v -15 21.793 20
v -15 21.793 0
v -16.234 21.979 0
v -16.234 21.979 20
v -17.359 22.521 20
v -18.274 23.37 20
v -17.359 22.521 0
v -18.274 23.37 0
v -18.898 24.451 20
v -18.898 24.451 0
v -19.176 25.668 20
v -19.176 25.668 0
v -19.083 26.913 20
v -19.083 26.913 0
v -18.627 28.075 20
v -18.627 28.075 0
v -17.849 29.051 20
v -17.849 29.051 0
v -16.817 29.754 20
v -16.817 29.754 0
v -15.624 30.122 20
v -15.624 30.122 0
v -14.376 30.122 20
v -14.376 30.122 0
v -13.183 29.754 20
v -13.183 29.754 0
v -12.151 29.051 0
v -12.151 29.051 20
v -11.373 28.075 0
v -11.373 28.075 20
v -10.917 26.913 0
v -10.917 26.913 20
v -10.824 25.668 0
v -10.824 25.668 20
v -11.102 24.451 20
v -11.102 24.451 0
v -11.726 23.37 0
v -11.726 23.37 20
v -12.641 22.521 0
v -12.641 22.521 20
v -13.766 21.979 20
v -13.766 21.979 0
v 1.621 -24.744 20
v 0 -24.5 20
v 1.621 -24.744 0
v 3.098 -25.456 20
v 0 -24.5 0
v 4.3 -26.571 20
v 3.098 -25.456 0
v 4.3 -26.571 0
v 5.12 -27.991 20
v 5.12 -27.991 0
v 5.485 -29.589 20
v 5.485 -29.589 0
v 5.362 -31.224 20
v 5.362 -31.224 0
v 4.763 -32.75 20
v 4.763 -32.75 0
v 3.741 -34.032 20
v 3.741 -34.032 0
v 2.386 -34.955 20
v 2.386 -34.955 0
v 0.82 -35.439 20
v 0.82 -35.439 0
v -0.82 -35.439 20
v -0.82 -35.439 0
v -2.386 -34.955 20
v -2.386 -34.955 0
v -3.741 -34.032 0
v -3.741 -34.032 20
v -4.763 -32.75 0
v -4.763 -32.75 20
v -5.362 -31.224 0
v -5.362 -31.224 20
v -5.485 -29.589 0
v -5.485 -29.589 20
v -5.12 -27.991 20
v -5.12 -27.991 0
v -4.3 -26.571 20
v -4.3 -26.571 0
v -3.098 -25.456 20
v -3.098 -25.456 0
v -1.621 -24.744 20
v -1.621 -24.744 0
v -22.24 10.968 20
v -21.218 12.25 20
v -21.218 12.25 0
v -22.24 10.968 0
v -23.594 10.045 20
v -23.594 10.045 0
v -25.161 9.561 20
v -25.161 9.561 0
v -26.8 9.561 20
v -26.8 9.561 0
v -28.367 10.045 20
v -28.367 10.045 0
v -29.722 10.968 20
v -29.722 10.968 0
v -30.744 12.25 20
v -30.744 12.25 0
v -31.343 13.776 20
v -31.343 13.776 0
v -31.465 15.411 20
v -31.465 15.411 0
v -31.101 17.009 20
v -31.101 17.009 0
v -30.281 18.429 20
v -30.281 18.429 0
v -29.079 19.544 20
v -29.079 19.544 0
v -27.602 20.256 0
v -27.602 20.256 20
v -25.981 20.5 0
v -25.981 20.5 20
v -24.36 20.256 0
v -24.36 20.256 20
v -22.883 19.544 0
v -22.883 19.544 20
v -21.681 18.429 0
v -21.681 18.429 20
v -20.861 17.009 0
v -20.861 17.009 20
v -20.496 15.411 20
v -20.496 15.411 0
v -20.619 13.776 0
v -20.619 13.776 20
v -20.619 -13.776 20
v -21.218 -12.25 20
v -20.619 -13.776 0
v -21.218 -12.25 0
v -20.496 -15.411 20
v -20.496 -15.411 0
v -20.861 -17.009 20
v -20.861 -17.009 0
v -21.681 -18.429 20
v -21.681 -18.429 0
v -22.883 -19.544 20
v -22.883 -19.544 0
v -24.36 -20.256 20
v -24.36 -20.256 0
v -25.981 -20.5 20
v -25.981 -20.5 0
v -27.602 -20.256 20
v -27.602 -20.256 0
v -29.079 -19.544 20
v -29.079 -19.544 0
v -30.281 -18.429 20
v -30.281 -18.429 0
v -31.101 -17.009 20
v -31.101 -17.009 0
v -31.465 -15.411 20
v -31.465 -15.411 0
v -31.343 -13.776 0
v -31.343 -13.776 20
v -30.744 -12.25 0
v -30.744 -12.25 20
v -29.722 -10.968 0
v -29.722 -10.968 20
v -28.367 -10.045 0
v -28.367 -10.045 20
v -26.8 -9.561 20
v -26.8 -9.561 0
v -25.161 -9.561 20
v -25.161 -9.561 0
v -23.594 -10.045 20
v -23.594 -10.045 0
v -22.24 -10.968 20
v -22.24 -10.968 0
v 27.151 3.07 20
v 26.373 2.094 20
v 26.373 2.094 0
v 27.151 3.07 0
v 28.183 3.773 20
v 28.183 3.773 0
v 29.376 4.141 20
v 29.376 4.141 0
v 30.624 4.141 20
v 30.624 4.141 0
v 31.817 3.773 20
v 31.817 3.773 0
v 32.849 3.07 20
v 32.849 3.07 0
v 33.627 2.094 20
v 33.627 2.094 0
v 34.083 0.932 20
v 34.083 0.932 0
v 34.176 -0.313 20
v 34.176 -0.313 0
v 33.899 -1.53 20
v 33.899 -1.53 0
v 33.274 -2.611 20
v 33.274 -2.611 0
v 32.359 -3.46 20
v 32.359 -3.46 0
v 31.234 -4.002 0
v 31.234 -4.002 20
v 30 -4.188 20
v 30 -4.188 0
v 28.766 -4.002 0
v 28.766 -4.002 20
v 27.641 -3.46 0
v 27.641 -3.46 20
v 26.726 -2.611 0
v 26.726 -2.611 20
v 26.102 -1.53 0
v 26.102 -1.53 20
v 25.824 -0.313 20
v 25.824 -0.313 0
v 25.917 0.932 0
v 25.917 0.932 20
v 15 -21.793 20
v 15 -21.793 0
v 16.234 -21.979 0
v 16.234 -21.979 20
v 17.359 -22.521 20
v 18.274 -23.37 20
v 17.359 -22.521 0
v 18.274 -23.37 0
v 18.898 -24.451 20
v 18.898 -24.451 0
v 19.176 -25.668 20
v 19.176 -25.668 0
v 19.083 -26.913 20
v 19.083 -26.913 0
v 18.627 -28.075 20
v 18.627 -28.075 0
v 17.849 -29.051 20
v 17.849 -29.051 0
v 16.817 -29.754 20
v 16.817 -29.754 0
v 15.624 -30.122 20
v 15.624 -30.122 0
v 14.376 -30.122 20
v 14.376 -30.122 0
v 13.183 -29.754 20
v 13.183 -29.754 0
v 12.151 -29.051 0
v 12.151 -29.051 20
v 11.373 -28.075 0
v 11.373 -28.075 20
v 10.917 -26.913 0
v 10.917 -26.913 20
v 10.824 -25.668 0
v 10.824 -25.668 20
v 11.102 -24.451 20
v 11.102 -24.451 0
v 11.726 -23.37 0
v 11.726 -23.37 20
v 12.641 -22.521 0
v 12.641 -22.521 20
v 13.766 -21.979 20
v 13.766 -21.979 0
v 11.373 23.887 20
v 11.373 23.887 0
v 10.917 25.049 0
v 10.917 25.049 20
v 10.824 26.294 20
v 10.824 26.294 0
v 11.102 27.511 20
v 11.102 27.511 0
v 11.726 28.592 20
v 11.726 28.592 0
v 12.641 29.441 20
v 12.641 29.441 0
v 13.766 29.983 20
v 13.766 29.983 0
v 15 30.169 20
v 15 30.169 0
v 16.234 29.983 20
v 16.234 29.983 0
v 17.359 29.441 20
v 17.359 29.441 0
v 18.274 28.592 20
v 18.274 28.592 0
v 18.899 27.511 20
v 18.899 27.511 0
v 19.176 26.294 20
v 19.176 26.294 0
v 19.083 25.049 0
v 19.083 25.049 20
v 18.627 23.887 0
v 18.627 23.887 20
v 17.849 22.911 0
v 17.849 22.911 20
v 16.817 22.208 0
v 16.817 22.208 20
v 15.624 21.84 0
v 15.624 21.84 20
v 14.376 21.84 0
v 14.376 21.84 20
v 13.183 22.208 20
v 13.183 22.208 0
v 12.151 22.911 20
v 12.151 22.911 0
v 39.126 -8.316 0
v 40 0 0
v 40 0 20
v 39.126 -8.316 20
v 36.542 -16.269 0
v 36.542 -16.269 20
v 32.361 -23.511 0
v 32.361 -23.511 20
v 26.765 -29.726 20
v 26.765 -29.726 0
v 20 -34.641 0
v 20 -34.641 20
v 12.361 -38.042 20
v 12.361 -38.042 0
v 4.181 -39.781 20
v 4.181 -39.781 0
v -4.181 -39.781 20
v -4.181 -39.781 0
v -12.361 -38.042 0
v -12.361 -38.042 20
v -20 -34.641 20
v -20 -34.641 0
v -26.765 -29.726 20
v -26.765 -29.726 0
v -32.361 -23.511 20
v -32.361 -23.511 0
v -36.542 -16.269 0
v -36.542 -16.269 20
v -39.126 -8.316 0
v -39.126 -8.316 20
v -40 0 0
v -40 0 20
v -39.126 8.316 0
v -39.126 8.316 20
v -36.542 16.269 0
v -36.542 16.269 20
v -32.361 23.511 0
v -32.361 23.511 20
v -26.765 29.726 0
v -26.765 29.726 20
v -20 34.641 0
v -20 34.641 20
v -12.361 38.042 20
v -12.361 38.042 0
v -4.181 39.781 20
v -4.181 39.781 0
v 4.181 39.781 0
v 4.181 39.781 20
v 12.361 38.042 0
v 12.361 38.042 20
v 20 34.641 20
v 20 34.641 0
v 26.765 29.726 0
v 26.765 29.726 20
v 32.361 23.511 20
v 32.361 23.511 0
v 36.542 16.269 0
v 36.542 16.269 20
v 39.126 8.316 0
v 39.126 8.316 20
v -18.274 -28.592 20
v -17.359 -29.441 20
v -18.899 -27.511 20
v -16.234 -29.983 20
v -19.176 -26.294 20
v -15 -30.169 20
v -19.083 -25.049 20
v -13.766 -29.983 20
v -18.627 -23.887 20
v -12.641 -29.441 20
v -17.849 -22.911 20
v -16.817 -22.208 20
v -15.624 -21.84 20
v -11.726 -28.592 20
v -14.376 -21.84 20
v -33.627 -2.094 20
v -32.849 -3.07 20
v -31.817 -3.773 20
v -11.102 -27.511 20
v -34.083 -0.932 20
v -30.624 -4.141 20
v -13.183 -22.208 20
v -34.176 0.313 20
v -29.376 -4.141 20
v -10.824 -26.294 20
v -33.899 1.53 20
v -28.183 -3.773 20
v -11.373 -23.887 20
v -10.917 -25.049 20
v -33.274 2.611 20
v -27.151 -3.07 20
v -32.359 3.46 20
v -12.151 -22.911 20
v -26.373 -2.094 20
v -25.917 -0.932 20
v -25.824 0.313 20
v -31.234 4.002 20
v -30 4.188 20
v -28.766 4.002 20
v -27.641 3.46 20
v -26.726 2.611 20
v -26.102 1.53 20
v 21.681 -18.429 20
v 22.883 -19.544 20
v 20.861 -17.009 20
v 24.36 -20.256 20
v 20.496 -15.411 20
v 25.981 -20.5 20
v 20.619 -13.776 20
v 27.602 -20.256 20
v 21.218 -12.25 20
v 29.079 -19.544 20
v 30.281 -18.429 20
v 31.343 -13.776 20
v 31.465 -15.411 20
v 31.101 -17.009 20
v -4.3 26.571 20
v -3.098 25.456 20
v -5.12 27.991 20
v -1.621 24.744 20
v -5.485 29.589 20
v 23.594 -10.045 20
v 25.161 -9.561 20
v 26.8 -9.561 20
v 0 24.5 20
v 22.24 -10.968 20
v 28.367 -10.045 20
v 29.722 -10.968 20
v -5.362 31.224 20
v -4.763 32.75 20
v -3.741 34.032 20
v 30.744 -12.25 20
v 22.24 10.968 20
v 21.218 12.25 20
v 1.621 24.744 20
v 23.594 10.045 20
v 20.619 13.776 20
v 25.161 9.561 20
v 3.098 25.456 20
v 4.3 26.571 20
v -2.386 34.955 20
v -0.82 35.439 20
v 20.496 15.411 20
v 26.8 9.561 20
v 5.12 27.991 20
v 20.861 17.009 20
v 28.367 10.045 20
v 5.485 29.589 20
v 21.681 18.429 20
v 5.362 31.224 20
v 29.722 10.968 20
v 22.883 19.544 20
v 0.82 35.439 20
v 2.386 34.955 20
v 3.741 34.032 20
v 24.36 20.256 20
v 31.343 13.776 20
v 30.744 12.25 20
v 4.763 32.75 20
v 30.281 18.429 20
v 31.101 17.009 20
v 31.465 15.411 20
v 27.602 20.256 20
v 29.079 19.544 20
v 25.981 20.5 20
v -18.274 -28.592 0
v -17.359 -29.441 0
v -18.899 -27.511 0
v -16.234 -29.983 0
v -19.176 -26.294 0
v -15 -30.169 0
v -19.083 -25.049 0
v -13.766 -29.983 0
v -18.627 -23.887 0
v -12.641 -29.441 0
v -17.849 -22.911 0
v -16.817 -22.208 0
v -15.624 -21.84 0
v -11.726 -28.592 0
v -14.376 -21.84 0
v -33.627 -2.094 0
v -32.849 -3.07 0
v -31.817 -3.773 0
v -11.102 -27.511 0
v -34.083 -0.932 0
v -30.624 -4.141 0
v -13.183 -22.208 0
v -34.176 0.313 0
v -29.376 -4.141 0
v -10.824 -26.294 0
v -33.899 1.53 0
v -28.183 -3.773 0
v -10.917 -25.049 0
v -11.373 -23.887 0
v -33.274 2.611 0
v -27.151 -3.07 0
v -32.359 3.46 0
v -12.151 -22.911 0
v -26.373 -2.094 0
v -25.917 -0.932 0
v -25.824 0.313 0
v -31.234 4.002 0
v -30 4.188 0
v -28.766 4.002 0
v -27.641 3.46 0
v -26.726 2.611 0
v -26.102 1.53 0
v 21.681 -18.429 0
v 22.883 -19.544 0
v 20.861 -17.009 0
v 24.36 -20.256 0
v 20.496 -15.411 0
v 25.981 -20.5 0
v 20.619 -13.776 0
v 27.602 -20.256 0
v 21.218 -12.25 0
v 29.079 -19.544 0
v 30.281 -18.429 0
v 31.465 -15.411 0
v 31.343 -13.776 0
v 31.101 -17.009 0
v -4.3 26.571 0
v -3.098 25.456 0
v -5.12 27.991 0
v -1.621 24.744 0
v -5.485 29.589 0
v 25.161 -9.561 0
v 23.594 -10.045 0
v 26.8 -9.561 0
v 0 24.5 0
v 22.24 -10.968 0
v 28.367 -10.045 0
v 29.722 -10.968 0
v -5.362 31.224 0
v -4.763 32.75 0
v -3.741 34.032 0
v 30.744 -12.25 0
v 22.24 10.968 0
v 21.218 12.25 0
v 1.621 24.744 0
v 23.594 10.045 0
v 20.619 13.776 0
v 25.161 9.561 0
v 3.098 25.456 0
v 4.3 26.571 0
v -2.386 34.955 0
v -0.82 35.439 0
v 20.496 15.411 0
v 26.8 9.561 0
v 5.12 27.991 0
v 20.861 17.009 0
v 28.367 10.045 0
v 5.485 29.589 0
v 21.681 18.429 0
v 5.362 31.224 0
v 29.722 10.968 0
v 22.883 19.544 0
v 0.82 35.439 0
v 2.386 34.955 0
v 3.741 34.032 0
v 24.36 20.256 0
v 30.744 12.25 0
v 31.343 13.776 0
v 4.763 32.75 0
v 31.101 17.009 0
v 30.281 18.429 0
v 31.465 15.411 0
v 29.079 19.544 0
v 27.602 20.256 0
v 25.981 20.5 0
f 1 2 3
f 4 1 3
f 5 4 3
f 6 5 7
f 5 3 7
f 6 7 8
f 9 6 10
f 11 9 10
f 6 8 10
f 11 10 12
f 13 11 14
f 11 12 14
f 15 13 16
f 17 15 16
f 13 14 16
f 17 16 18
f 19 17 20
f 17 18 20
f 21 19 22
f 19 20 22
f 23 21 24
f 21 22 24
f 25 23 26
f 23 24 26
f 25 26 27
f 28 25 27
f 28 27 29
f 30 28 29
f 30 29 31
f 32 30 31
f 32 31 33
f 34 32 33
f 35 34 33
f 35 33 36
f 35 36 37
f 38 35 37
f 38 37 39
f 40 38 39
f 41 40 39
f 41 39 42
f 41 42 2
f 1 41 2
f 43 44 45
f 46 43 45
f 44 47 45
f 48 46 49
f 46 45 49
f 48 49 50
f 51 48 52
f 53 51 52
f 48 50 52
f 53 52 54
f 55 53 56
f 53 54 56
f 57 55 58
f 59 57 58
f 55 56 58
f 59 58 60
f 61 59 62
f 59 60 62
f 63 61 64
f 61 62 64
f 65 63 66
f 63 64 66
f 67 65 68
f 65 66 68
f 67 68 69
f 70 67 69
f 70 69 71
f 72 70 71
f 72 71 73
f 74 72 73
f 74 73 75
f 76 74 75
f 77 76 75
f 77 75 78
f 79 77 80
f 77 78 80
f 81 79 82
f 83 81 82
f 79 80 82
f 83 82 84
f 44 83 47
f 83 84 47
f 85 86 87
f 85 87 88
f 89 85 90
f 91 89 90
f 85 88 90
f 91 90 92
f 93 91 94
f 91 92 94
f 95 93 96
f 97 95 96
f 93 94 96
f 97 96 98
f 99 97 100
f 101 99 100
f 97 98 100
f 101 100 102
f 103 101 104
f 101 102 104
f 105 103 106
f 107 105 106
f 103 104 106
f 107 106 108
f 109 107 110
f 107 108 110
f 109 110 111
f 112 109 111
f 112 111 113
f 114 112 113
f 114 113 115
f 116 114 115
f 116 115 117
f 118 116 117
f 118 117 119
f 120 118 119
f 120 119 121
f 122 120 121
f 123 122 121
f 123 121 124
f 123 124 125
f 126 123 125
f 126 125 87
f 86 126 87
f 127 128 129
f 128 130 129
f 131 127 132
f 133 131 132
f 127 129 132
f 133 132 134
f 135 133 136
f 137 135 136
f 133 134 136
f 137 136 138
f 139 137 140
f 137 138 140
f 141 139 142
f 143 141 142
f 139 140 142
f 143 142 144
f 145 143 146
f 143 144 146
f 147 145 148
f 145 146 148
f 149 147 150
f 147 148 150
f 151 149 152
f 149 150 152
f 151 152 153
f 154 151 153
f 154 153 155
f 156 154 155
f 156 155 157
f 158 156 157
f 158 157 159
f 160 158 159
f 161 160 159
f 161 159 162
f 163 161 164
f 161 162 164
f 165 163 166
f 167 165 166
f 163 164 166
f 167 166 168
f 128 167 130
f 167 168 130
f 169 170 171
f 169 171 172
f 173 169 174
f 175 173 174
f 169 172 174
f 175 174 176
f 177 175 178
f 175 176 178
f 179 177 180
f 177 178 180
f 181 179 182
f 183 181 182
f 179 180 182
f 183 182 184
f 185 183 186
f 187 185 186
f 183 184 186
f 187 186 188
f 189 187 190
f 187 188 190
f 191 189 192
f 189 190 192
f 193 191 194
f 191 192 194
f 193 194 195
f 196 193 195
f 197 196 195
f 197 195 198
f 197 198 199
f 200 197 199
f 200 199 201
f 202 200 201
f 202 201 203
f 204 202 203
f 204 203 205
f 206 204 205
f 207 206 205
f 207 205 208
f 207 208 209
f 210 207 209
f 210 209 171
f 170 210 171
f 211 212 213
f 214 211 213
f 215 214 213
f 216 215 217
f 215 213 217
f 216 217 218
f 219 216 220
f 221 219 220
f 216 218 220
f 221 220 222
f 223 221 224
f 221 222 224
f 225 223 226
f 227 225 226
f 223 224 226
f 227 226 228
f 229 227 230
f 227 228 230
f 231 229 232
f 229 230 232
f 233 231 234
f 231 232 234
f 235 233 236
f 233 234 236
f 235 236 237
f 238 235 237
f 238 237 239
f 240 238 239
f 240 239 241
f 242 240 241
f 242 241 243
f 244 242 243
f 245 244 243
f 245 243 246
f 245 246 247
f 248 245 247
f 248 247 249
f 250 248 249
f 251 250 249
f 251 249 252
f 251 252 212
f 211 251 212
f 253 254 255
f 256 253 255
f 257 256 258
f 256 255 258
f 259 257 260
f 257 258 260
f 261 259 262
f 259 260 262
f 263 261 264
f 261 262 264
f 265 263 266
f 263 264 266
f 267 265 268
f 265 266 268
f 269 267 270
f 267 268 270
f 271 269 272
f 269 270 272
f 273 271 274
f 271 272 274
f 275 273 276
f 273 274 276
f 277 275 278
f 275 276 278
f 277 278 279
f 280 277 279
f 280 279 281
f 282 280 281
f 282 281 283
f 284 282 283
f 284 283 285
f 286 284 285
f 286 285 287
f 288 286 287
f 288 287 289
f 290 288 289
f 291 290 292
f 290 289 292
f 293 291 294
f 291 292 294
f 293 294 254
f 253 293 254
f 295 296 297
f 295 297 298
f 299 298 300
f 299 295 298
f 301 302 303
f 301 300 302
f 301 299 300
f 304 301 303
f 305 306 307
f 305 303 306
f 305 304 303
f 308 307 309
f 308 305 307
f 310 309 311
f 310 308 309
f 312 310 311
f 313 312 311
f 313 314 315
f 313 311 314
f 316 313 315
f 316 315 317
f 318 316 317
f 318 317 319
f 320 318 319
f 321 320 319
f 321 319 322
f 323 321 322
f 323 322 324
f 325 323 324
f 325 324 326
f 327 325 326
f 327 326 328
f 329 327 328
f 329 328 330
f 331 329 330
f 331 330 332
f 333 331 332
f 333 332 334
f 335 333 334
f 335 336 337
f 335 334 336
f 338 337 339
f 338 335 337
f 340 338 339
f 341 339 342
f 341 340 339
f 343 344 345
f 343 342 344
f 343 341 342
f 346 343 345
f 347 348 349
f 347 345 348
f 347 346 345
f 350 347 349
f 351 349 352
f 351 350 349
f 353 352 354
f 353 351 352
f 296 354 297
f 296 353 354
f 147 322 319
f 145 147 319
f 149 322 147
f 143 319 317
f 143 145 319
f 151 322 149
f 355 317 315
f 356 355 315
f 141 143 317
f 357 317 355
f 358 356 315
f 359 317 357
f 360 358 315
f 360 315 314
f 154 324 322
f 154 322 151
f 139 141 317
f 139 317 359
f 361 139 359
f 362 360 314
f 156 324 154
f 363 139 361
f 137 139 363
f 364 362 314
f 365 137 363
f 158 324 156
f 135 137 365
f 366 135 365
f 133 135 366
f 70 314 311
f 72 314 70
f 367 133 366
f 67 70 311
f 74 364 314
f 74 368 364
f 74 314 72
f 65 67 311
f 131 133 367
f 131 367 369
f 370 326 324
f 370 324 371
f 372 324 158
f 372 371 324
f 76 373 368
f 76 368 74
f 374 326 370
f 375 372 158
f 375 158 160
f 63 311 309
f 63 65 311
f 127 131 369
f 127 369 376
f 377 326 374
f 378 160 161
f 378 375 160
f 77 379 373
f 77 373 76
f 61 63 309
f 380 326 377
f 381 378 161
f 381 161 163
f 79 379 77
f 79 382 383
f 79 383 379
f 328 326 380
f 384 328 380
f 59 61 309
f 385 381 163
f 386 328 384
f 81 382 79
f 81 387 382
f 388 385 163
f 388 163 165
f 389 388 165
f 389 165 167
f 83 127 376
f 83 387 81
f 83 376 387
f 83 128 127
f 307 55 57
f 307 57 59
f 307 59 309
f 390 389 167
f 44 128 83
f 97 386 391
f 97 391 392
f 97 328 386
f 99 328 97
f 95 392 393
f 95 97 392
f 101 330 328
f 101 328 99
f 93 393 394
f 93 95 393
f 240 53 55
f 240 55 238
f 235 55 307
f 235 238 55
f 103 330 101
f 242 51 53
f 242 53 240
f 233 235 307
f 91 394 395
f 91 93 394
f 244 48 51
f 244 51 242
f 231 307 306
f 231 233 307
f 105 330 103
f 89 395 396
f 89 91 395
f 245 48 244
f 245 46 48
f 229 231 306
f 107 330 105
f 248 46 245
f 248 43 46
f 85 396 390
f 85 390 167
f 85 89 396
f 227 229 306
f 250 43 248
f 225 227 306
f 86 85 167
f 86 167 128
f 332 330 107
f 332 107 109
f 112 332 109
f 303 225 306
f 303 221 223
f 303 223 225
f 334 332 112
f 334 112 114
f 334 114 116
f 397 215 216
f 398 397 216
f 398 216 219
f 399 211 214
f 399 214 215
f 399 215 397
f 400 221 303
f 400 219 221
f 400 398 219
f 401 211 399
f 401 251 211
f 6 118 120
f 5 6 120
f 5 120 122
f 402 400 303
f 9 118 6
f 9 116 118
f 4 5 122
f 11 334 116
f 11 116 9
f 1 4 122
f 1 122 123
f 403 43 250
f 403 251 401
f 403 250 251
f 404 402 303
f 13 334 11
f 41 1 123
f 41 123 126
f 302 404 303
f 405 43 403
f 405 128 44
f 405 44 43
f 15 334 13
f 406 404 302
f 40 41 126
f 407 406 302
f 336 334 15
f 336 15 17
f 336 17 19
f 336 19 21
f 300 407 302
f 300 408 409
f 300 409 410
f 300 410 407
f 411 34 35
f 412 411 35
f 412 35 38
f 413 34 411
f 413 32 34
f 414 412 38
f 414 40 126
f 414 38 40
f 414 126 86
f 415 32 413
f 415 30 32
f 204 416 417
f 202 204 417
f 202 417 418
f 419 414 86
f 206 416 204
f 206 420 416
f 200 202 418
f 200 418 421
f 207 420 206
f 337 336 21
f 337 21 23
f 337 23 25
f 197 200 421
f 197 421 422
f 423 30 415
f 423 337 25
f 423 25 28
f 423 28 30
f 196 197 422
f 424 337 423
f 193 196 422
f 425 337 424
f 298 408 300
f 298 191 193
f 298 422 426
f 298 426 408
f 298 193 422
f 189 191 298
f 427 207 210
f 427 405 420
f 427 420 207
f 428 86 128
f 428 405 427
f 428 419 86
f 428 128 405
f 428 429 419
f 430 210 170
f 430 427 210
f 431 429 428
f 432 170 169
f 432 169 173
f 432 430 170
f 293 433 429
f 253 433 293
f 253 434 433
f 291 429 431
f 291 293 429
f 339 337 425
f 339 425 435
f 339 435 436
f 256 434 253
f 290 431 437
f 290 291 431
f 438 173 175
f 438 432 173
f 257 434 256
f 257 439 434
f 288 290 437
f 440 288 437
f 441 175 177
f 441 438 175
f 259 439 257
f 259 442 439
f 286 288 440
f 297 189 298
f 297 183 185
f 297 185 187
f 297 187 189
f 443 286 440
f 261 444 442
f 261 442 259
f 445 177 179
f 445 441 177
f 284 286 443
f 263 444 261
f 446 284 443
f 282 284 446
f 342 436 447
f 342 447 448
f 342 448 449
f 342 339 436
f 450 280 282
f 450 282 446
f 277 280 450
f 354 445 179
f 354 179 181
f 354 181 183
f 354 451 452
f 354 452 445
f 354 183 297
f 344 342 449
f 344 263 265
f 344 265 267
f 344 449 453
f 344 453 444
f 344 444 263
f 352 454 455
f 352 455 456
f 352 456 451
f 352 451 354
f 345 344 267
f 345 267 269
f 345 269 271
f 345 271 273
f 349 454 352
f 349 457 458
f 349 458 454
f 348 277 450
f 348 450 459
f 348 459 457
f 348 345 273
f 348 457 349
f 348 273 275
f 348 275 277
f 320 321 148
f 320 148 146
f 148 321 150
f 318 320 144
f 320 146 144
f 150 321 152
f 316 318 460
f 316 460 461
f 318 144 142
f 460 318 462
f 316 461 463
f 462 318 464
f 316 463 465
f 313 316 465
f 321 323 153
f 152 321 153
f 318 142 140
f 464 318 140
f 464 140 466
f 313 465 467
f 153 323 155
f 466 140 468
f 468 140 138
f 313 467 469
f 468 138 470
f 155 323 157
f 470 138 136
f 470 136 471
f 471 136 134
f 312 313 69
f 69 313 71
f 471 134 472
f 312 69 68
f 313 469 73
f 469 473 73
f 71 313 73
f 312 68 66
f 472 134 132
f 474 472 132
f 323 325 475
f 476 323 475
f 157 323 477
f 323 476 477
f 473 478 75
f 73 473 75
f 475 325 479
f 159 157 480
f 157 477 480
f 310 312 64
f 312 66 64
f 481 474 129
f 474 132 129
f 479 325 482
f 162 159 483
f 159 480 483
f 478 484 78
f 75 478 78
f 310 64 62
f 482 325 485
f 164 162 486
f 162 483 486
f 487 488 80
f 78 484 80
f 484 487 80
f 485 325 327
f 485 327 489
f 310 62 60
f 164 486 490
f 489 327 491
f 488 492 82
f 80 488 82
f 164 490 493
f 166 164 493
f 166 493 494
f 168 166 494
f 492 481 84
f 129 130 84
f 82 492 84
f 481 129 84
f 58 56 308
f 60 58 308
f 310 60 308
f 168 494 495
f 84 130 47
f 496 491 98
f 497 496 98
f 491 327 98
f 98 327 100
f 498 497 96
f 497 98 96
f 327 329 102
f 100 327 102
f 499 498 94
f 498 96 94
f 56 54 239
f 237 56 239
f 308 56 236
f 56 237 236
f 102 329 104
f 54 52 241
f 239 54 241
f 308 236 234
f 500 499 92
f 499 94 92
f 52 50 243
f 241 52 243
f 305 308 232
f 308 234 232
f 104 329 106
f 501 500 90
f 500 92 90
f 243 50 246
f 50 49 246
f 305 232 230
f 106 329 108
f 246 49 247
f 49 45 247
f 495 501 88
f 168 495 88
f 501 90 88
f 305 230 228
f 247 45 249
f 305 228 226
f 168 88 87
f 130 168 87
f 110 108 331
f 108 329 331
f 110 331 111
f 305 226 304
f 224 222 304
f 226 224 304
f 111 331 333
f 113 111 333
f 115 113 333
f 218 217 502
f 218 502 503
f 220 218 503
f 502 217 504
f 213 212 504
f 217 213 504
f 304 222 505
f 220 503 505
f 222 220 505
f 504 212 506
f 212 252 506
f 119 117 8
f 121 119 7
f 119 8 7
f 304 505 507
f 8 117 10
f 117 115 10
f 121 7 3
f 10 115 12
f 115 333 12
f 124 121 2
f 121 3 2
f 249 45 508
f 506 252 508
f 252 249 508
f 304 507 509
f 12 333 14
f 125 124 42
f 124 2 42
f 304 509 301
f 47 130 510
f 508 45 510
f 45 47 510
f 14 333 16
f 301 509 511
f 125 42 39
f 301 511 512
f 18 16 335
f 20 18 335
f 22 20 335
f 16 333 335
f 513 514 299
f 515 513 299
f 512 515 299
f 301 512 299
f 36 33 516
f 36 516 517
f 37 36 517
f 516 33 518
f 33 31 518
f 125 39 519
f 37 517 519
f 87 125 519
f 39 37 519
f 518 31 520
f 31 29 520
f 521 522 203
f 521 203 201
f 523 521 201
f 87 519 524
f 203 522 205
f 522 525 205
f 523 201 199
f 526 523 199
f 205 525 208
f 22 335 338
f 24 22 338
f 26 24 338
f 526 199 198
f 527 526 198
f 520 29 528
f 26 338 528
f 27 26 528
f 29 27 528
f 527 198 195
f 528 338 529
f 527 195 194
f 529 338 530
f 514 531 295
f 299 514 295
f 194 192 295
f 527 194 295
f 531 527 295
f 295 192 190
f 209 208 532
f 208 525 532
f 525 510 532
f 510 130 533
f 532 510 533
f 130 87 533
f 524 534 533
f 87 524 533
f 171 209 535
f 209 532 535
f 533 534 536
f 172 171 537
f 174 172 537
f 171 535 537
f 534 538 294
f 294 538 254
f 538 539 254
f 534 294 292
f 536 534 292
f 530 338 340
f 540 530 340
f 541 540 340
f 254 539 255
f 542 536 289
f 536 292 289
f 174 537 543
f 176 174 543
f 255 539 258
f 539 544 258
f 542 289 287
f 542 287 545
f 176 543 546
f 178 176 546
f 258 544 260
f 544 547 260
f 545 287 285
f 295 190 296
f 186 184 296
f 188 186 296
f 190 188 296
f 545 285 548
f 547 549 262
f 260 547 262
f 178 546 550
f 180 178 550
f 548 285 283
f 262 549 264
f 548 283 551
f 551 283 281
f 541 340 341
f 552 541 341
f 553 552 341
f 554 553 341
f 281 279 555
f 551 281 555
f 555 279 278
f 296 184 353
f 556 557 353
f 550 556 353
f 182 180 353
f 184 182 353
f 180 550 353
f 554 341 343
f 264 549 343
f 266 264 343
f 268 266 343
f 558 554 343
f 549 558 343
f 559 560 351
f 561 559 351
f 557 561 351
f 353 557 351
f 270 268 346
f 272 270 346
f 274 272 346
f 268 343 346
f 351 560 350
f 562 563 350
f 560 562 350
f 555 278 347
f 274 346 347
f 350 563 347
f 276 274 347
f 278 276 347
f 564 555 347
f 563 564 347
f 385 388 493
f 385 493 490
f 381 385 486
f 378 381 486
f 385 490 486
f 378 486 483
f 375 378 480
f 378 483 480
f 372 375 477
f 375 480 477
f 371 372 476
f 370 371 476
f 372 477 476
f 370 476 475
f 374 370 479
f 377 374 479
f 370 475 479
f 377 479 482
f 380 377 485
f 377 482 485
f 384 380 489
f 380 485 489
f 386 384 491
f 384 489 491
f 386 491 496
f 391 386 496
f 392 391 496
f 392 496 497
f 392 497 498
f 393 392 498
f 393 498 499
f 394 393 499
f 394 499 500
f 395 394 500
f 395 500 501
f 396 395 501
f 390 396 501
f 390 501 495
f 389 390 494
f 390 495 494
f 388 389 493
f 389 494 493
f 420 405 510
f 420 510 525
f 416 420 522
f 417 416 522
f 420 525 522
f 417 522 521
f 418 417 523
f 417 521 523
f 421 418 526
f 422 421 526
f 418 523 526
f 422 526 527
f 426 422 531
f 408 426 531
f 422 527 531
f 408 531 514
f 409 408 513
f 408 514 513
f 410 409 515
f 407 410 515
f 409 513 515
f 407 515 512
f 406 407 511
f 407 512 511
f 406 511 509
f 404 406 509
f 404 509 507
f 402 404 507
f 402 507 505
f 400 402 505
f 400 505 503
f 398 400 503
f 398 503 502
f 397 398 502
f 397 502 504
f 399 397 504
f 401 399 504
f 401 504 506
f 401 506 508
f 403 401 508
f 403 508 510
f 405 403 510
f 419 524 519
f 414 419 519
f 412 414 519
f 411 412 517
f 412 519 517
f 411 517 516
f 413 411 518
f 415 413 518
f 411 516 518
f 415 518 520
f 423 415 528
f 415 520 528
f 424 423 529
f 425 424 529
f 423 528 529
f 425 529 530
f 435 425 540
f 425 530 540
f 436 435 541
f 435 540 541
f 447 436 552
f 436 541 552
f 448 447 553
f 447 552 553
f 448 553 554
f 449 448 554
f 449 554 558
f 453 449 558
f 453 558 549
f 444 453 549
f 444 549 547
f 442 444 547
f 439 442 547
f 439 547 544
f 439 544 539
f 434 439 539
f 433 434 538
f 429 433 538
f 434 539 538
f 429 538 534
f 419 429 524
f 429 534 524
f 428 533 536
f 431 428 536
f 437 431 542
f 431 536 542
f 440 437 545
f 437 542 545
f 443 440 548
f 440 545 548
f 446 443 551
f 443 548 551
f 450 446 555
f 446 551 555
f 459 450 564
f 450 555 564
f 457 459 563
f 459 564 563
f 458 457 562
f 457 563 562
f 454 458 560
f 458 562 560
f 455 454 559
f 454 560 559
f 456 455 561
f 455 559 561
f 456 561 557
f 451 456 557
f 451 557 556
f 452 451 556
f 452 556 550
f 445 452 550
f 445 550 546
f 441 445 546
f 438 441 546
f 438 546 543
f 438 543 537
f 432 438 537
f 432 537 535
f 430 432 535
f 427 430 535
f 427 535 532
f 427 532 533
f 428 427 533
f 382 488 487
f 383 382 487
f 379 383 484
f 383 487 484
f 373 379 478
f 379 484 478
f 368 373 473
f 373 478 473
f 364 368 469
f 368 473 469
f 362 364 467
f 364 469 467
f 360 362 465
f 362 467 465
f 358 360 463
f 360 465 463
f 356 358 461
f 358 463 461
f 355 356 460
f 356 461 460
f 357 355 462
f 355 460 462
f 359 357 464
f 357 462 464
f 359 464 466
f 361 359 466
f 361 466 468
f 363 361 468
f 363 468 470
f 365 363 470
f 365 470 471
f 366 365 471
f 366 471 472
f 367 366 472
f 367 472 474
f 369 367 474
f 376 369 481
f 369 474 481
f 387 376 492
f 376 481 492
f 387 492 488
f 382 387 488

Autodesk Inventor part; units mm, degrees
ref_plane "YZ Plane" through (0, 0, 0) normal (1, 0, 0) x (0, 1, 0)
ref_plane "XZ Plane" through (0, 0, 0) normal (0, 1, 0) x (-1, 0, 0)
ref_plane "XY Plane" through (0, 0, 0) normal (0, 0, 1) x (1, 0, 0)
sketch "Esboço1" plane through (0, 0, 0) normal (0, 0, 1) x (1, 0, 0)
  circle A0 centre (0, 0) radius 40
  dimension "d0" = 80
extrude "Extrusão1" add sketch "Esboço1" along normal blind 20
sketch "Esboço2" plane through (0, 0, 20) normal (0, 0, 1) x (1, 0, 0)
  point P0 (0, 0)
  point P1 (0, 30)
  dimension "d3" = 30
hole "Furo1" at (0, 30, 20) direction (0, 0, -1) diameter 11 end through all
pattern_circular "Padrão circular1" count 6 over 360 about axis through (0, 0, 0) along (0, 0, 1) of "Furo1"
sketch "Esboço3" plane through (0, 0, 20) normal (0, 0, 1) x (1, 0, 0)
  circle A0 centre (0, 30) radius 5.5 projected
  circle A1 centre (0, 0) radius 30 construction
  line L0 (0, 0) -> (-62.0397, 0) construction
  line L1 (0, 0) -> (-27.415, 47.4843)
  point P0 (-15, 25.9808)
  dimension "d14" = 60
hole "Furo2" at (-15, 25.9808, 20) direction (0, 0, -1) diameter 8.376 end through all thread size "M10x1.5" class "6H" standard "ISO Metric profile"
pattern_circular "Padrão circular2" count 6 over 360 about axis through (0, 0, 0) along (0, 0, 1) of "Furo2"
properties part number "3D Model"
